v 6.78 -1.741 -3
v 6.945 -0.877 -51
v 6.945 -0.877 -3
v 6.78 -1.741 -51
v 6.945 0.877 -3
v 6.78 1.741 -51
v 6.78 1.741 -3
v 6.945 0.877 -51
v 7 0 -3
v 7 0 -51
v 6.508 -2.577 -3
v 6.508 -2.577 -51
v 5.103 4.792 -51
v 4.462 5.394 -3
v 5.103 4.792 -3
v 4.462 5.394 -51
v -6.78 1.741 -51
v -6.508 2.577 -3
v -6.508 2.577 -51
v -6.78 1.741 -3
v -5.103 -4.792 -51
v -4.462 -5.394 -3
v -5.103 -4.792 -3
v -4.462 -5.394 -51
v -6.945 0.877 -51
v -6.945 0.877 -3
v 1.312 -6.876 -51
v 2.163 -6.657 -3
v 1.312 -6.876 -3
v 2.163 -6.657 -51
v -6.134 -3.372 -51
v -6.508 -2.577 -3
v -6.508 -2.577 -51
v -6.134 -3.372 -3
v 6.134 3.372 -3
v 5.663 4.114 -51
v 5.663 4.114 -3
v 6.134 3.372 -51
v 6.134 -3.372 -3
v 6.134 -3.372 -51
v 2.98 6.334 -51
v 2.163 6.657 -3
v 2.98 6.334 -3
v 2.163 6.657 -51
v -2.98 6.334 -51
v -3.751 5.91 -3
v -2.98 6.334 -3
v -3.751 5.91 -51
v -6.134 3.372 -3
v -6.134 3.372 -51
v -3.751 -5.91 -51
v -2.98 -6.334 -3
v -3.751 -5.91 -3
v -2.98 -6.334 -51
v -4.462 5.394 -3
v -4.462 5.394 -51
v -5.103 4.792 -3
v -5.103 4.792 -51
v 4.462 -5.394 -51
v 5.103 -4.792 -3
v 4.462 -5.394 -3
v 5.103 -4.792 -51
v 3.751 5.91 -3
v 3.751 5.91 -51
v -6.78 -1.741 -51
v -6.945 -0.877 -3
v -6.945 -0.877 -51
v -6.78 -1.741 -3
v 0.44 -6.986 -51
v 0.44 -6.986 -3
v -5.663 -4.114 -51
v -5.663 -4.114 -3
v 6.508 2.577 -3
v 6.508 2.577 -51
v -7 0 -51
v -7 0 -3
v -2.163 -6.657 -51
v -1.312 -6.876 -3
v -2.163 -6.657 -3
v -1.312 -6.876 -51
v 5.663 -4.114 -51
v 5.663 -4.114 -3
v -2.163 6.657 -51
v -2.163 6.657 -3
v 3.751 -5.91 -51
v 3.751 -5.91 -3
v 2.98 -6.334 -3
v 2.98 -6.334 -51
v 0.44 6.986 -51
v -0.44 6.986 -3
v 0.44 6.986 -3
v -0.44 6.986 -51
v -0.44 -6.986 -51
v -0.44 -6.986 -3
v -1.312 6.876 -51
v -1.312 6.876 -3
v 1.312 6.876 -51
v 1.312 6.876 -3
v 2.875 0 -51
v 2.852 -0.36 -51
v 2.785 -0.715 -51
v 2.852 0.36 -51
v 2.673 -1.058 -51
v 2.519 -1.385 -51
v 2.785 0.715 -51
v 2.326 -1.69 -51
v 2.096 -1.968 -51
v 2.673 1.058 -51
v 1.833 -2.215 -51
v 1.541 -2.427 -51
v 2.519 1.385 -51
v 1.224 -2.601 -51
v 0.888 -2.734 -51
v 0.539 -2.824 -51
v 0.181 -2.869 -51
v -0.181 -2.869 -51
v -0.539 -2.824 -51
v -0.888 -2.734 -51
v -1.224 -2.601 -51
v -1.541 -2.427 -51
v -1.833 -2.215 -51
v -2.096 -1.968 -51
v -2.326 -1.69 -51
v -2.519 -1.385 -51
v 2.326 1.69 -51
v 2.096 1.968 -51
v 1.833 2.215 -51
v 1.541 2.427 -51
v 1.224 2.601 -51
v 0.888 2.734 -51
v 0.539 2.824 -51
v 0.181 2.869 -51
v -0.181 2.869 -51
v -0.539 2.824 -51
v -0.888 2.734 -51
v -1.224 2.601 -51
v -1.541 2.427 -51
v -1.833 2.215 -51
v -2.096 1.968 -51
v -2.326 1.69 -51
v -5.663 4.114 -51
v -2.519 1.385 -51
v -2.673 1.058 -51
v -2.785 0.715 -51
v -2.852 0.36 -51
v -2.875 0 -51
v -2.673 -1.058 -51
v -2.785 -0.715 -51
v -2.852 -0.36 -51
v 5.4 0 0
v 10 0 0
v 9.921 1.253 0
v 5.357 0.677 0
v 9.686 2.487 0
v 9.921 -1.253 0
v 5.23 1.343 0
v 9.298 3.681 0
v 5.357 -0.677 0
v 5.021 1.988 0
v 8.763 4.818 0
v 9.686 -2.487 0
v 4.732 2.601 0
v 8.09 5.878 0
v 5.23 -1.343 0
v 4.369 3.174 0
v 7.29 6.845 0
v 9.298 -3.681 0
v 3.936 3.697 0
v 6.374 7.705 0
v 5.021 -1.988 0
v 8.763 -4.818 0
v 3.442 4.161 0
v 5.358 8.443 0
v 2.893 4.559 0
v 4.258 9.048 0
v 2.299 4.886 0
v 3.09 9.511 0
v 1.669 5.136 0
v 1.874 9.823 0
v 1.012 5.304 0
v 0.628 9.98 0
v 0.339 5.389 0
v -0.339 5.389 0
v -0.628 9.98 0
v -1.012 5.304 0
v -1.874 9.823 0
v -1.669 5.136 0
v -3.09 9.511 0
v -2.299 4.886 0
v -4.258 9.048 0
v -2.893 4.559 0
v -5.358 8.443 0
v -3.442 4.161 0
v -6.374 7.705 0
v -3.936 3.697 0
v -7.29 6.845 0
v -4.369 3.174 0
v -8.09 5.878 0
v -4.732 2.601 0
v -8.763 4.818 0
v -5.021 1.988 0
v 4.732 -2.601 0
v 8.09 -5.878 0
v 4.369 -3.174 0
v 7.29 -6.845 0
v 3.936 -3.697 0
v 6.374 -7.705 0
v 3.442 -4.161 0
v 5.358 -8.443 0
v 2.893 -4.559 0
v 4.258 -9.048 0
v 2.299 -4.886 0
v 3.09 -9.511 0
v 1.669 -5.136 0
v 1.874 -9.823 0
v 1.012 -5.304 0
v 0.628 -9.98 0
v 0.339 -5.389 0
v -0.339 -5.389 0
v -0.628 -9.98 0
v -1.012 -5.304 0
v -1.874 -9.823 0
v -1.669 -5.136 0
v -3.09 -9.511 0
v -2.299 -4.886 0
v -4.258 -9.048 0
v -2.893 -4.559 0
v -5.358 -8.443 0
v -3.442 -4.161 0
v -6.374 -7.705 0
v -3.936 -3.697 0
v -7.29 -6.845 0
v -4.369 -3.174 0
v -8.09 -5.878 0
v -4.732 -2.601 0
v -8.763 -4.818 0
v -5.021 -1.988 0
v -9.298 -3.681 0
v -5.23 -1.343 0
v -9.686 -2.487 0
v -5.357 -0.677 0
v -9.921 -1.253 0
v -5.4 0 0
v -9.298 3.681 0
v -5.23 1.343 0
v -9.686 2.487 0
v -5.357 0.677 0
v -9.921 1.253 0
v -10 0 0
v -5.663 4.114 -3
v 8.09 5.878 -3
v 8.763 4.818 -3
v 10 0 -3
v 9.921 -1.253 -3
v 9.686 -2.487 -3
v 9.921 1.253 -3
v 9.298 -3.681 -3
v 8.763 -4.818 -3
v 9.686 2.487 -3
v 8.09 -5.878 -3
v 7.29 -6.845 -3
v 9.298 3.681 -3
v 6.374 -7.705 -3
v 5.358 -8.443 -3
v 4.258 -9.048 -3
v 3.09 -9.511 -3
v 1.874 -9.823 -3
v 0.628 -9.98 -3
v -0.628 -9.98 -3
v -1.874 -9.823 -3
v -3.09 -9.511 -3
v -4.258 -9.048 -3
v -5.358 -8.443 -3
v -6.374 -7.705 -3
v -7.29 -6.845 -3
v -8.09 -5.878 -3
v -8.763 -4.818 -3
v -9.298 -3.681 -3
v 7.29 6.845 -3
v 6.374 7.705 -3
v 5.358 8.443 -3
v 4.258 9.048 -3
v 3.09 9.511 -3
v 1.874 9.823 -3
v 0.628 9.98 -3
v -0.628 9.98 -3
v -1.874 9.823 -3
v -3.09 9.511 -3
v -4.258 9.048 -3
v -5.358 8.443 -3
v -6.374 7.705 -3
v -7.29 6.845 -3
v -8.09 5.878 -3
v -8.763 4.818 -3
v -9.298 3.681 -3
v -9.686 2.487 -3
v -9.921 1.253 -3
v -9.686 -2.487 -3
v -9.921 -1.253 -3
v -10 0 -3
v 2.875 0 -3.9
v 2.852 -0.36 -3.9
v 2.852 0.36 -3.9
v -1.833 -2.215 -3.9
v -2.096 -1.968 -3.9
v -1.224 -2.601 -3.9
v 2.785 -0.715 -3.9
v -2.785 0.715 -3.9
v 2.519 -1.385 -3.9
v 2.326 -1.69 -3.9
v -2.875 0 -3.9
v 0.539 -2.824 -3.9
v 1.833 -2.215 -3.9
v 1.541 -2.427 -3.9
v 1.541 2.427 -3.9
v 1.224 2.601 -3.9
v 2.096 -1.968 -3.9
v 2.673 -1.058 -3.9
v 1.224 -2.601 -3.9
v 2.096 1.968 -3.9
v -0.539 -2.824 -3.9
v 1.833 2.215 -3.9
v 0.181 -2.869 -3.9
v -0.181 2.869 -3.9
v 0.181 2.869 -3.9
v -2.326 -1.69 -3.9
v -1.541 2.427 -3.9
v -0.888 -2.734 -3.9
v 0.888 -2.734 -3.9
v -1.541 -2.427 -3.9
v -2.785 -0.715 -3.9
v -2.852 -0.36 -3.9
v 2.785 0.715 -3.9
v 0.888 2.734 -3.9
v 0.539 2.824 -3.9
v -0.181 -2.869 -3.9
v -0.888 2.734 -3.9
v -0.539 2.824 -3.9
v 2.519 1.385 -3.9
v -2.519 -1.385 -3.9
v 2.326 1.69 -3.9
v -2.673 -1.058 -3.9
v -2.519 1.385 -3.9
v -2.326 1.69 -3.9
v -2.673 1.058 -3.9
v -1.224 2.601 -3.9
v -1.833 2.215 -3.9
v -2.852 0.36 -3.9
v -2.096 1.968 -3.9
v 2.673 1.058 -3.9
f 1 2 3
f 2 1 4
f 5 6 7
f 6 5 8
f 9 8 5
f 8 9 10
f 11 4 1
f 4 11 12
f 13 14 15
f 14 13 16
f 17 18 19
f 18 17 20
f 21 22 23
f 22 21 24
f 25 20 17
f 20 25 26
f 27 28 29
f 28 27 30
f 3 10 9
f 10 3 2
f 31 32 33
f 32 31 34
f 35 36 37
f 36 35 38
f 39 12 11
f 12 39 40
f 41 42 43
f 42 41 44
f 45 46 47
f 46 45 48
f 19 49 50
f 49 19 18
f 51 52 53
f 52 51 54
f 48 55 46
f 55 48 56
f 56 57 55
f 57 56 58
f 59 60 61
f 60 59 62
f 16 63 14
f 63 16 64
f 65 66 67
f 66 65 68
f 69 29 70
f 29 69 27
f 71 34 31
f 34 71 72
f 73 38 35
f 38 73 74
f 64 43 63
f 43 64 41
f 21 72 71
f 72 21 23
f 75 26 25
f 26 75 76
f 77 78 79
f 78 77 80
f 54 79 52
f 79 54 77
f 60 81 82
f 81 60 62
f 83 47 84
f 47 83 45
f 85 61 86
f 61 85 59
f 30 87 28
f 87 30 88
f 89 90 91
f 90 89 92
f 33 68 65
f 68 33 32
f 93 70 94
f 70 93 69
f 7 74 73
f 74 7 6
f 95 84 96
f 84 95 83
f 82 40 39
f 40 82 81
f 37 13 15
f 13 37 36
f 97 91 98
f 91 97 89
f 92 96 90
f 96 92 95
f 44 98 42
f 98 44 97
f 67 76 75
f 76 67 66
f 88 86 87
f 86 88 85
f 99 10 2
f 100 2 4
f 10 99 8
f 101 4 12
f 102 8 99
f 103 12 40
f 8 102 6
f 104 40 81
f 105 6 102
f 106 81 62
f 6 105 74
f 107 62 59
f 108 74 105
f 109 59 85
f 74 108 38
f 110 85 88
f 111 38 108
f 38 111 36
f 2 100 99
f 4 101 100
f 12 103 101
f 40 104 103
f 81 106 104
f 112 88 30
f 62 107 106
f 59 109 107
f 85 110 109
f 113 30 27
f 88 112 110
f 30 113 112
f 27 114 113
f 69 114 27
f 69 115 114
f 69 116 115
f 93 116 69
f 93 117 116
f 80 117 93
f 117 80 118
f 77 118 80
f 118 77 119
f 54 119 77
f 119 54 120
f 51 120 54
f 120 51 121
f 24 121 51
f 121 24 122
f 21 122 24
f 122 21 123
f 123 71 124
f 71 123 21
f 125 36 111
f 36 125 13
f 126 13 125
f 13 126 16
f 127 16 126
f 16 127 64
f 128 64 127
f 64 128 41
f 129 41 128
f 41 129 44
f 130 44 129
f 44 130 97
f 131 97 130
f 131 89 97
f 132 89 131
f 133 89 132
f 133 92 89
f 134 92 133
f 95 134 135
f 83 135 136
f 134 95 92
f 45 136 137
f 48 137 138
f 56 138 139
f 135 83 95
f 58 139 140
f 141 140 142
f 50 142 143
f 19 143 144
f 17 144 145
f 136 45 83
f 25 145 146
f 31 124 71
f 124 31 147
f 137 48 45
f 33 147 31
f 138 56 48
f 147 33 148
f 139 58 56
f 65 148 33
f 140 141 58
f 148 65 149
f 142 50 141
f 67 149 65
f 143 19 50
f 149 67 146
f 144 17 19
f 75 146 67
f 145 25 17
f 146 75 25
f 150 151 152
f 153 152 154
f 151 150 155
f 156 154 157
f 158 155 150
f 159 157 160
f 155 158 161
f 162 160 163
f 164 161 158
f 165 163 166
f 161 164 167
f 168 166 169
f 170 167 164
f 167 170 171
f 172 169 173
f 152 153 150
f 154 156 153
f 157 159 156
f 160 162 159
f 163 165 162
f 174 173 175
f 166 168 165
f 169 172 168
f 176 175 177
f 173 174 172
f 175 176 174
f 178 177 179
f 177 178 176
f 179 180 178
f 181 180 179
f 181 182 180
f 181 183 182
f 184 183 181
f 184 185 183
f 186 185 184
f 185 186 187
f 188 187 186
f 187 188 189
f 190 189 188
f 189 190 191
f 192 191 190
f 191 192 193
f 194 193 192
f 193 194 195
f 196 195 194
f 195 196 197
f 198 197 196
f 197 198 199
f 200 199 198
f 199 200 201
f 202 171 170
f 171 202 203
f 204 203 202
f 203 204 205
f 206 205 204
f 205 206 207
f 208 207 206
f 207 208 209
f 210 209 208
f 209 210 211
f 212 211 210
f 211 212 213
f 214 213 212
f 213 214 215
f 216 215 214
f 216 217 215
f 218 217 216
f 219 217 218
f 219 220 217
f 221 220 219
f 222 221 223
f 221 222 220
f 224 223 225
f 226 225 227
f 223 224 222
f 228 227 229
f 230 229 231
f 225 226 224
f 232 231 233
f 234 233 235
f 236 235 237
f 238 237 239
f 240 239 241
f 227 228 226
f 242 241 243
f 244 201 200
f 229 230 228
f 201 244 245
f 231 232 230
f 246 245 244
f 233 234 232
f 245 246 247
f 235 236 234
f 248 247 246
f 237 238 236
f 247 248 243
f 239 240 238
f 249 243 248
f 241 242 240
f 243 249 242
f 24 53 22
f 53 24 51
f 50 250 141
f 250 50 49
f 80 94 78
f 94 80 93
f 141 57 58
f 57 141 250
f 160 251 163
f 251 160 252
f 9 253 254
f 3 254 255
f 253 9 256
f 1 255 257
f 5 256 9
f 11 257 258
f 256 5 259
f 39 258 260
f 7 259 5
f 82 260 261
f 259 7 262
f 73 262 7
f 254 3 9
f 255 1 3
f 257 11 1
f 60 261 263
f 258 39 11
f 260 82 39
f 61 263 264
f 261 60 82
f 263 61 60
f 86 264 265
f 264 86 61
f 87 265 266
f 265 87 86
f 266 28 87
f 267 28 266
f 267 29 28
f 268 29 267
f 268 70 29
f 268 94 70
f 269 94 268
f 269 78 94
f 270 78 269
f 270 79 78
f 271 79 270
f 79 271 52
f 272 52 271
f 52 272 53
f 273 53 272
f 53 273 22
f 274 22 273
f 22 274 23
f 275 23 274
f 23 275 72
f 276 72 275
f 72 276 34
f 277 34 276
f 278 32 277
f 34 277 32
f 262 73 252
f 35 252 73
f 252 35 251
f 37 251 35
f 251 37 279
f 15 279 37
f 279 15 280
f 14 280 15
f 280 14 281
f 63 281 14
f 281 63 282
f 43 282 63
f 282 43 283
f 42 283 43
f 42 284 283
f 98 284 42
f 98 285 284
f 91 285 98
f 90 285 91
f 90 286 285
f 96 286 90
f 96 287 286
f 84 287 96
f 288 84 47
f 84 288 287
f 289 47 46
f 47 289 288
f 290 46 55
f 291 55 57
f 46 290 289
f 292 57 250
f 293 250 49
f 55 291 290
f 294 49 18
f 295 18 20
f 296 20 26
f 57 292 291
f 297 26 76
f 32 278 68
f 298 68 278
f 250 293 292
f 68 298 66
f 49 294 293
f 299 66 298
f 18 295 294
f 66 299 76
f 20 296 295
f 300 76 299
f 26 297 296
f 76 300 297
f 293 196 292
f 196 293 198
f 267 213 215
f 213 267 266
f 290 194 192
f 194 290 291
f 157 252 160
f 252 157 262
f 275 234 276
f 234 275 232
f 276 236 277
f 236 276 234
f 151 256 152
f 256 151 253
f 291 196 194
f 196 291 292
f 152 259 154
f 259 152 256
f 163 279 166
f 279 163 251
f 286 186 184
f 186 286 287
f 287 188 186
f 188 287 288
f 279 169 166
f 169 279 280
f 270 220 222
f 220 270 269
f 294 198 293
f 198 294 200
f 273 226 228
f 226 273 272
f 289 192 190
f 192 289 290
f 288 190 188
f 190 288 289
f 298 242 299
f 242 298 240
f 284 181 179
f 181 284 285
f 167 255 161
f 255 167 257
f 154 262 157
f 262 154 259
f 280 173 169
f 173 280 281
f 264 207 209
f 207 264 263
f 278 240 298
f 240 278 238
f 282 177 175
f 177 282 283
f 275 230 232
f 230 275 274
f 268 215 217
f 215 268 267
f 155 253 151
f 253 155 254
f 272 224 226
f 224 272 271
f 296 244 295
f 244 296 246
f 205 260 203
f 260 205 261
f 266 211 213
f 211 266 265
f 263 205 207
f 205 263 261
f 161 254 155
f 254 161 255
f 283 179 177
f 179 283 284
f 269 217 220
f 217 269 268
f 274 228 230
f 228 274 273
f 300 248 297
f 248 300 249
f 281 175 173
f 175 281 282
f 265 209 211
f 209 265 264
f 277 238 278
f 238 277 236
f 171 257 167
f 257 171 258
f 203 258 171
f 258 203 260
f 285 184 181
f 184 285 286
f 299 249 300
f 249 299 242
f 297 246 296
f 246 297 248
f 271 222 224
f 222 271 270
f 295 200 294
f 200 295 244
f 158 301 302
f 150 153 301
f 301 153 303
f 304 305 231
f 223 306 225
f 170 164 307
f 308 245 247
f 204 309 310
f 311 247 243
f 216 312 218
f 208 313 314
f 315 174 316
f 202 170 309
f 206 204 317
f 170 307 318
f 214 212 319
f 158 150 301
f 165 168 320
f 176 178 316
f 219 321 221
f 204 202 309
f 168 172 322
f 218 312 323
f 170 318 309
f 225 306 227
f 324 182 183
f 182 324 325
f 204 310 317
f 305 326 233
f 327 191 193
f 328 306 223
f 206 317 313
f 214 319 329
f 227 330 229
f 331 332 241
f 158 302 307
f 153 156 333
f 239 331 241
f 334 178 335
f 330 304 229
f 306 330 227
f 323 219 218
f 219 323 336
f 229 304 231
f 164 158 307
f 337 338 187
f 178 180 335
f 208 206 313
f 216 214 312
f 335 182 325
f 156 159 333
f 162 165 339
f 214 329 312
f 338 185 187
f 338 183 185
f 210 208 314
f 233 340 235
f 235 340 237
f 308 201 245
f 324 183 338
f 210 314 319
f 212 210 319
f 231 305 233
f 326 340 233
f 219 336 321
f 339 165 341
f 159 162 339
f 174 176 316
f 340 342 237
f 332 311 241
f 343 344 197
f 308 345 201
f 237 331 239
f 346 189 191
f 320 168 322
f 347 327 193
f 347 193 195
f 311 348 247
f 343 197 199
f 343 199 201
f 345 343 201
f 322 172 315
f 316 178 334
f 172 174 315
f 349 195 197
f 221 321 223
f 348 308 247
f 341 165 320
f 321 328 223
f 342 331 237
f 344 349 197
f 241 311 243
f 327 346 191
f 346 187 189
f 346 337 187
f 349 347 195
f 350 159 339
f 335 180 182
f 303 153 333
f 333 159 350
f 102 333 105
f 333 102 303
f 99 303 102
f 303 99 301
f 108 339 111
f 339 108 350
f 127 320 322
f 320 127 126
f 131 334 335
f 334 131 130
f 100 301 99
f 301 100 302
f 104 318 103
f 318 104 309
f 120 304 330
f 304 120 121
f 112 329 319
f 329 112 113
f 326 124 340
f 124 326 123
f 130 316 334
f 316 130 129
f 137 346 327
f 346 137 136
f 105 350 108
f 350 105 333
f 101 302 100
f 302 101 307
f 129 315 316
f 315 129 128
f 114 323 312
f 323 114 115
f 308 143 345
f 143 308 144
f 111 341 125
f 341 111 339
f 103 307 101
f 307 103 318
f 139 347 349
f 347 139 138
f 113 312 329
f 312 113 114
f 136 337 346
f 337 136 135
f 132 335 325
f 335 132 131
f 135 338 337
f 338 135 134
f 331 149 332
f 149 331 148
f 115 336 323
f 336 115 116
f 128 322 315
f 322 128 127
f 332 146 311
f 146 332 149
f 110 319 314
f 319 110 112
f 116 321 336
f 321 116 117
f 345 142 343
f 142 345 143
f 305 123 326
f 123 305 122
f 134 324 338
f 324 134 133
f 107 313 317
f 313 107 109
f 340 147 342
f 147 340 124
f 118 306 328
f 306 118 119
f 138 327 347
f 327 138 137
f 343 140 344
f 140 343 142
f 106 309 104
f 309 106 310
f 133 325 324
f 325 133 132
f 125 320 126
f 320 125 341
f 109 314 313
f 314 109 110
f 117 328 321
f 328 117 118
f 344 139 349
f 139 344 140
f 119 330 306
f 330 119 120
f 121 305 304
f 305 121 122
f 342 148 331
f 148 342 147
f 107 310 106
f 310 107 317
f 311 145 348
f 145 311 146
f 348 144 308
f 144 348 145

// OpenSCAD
$fn = 50;


difference() {
	union() {
		translate(v = [0, 0, -51.0000000000]) {
			cylinder(h = 51, r = 7.0000000000);
		}
		translate(v = [0, 0, -3.0000000000]) {
			cylinder(h = 3, r = 10.0000000000);
		}
	}
	union() {
		translate(v = [0, 0, 0]) {
			rotate(a = [0, 0, 0]) {
				difference() {
					union() {
						#translate(v = [0, 0, -51.0000000000]) {
							cylinder(h = 51, r = 2.6000000000);
						}
						#translate(v = [0, 0, -3.9000000000]) {
							cylinder(h = 3.9000000000, r = 7.0000000000, r1 = 2.8750000000, r2 = 5.4000000000);
						}
						#translate(v = [0, 0, -51.0000000000]) {
							cylinder(h = 51, r = 2.8750000000);
						}
						#translate(v = [0, 0, -51.0000000000]) {
							cylinder(h = 51, r = 2.6000000000);
						}
					}
					union();
				}
			}
		}
	}
}
